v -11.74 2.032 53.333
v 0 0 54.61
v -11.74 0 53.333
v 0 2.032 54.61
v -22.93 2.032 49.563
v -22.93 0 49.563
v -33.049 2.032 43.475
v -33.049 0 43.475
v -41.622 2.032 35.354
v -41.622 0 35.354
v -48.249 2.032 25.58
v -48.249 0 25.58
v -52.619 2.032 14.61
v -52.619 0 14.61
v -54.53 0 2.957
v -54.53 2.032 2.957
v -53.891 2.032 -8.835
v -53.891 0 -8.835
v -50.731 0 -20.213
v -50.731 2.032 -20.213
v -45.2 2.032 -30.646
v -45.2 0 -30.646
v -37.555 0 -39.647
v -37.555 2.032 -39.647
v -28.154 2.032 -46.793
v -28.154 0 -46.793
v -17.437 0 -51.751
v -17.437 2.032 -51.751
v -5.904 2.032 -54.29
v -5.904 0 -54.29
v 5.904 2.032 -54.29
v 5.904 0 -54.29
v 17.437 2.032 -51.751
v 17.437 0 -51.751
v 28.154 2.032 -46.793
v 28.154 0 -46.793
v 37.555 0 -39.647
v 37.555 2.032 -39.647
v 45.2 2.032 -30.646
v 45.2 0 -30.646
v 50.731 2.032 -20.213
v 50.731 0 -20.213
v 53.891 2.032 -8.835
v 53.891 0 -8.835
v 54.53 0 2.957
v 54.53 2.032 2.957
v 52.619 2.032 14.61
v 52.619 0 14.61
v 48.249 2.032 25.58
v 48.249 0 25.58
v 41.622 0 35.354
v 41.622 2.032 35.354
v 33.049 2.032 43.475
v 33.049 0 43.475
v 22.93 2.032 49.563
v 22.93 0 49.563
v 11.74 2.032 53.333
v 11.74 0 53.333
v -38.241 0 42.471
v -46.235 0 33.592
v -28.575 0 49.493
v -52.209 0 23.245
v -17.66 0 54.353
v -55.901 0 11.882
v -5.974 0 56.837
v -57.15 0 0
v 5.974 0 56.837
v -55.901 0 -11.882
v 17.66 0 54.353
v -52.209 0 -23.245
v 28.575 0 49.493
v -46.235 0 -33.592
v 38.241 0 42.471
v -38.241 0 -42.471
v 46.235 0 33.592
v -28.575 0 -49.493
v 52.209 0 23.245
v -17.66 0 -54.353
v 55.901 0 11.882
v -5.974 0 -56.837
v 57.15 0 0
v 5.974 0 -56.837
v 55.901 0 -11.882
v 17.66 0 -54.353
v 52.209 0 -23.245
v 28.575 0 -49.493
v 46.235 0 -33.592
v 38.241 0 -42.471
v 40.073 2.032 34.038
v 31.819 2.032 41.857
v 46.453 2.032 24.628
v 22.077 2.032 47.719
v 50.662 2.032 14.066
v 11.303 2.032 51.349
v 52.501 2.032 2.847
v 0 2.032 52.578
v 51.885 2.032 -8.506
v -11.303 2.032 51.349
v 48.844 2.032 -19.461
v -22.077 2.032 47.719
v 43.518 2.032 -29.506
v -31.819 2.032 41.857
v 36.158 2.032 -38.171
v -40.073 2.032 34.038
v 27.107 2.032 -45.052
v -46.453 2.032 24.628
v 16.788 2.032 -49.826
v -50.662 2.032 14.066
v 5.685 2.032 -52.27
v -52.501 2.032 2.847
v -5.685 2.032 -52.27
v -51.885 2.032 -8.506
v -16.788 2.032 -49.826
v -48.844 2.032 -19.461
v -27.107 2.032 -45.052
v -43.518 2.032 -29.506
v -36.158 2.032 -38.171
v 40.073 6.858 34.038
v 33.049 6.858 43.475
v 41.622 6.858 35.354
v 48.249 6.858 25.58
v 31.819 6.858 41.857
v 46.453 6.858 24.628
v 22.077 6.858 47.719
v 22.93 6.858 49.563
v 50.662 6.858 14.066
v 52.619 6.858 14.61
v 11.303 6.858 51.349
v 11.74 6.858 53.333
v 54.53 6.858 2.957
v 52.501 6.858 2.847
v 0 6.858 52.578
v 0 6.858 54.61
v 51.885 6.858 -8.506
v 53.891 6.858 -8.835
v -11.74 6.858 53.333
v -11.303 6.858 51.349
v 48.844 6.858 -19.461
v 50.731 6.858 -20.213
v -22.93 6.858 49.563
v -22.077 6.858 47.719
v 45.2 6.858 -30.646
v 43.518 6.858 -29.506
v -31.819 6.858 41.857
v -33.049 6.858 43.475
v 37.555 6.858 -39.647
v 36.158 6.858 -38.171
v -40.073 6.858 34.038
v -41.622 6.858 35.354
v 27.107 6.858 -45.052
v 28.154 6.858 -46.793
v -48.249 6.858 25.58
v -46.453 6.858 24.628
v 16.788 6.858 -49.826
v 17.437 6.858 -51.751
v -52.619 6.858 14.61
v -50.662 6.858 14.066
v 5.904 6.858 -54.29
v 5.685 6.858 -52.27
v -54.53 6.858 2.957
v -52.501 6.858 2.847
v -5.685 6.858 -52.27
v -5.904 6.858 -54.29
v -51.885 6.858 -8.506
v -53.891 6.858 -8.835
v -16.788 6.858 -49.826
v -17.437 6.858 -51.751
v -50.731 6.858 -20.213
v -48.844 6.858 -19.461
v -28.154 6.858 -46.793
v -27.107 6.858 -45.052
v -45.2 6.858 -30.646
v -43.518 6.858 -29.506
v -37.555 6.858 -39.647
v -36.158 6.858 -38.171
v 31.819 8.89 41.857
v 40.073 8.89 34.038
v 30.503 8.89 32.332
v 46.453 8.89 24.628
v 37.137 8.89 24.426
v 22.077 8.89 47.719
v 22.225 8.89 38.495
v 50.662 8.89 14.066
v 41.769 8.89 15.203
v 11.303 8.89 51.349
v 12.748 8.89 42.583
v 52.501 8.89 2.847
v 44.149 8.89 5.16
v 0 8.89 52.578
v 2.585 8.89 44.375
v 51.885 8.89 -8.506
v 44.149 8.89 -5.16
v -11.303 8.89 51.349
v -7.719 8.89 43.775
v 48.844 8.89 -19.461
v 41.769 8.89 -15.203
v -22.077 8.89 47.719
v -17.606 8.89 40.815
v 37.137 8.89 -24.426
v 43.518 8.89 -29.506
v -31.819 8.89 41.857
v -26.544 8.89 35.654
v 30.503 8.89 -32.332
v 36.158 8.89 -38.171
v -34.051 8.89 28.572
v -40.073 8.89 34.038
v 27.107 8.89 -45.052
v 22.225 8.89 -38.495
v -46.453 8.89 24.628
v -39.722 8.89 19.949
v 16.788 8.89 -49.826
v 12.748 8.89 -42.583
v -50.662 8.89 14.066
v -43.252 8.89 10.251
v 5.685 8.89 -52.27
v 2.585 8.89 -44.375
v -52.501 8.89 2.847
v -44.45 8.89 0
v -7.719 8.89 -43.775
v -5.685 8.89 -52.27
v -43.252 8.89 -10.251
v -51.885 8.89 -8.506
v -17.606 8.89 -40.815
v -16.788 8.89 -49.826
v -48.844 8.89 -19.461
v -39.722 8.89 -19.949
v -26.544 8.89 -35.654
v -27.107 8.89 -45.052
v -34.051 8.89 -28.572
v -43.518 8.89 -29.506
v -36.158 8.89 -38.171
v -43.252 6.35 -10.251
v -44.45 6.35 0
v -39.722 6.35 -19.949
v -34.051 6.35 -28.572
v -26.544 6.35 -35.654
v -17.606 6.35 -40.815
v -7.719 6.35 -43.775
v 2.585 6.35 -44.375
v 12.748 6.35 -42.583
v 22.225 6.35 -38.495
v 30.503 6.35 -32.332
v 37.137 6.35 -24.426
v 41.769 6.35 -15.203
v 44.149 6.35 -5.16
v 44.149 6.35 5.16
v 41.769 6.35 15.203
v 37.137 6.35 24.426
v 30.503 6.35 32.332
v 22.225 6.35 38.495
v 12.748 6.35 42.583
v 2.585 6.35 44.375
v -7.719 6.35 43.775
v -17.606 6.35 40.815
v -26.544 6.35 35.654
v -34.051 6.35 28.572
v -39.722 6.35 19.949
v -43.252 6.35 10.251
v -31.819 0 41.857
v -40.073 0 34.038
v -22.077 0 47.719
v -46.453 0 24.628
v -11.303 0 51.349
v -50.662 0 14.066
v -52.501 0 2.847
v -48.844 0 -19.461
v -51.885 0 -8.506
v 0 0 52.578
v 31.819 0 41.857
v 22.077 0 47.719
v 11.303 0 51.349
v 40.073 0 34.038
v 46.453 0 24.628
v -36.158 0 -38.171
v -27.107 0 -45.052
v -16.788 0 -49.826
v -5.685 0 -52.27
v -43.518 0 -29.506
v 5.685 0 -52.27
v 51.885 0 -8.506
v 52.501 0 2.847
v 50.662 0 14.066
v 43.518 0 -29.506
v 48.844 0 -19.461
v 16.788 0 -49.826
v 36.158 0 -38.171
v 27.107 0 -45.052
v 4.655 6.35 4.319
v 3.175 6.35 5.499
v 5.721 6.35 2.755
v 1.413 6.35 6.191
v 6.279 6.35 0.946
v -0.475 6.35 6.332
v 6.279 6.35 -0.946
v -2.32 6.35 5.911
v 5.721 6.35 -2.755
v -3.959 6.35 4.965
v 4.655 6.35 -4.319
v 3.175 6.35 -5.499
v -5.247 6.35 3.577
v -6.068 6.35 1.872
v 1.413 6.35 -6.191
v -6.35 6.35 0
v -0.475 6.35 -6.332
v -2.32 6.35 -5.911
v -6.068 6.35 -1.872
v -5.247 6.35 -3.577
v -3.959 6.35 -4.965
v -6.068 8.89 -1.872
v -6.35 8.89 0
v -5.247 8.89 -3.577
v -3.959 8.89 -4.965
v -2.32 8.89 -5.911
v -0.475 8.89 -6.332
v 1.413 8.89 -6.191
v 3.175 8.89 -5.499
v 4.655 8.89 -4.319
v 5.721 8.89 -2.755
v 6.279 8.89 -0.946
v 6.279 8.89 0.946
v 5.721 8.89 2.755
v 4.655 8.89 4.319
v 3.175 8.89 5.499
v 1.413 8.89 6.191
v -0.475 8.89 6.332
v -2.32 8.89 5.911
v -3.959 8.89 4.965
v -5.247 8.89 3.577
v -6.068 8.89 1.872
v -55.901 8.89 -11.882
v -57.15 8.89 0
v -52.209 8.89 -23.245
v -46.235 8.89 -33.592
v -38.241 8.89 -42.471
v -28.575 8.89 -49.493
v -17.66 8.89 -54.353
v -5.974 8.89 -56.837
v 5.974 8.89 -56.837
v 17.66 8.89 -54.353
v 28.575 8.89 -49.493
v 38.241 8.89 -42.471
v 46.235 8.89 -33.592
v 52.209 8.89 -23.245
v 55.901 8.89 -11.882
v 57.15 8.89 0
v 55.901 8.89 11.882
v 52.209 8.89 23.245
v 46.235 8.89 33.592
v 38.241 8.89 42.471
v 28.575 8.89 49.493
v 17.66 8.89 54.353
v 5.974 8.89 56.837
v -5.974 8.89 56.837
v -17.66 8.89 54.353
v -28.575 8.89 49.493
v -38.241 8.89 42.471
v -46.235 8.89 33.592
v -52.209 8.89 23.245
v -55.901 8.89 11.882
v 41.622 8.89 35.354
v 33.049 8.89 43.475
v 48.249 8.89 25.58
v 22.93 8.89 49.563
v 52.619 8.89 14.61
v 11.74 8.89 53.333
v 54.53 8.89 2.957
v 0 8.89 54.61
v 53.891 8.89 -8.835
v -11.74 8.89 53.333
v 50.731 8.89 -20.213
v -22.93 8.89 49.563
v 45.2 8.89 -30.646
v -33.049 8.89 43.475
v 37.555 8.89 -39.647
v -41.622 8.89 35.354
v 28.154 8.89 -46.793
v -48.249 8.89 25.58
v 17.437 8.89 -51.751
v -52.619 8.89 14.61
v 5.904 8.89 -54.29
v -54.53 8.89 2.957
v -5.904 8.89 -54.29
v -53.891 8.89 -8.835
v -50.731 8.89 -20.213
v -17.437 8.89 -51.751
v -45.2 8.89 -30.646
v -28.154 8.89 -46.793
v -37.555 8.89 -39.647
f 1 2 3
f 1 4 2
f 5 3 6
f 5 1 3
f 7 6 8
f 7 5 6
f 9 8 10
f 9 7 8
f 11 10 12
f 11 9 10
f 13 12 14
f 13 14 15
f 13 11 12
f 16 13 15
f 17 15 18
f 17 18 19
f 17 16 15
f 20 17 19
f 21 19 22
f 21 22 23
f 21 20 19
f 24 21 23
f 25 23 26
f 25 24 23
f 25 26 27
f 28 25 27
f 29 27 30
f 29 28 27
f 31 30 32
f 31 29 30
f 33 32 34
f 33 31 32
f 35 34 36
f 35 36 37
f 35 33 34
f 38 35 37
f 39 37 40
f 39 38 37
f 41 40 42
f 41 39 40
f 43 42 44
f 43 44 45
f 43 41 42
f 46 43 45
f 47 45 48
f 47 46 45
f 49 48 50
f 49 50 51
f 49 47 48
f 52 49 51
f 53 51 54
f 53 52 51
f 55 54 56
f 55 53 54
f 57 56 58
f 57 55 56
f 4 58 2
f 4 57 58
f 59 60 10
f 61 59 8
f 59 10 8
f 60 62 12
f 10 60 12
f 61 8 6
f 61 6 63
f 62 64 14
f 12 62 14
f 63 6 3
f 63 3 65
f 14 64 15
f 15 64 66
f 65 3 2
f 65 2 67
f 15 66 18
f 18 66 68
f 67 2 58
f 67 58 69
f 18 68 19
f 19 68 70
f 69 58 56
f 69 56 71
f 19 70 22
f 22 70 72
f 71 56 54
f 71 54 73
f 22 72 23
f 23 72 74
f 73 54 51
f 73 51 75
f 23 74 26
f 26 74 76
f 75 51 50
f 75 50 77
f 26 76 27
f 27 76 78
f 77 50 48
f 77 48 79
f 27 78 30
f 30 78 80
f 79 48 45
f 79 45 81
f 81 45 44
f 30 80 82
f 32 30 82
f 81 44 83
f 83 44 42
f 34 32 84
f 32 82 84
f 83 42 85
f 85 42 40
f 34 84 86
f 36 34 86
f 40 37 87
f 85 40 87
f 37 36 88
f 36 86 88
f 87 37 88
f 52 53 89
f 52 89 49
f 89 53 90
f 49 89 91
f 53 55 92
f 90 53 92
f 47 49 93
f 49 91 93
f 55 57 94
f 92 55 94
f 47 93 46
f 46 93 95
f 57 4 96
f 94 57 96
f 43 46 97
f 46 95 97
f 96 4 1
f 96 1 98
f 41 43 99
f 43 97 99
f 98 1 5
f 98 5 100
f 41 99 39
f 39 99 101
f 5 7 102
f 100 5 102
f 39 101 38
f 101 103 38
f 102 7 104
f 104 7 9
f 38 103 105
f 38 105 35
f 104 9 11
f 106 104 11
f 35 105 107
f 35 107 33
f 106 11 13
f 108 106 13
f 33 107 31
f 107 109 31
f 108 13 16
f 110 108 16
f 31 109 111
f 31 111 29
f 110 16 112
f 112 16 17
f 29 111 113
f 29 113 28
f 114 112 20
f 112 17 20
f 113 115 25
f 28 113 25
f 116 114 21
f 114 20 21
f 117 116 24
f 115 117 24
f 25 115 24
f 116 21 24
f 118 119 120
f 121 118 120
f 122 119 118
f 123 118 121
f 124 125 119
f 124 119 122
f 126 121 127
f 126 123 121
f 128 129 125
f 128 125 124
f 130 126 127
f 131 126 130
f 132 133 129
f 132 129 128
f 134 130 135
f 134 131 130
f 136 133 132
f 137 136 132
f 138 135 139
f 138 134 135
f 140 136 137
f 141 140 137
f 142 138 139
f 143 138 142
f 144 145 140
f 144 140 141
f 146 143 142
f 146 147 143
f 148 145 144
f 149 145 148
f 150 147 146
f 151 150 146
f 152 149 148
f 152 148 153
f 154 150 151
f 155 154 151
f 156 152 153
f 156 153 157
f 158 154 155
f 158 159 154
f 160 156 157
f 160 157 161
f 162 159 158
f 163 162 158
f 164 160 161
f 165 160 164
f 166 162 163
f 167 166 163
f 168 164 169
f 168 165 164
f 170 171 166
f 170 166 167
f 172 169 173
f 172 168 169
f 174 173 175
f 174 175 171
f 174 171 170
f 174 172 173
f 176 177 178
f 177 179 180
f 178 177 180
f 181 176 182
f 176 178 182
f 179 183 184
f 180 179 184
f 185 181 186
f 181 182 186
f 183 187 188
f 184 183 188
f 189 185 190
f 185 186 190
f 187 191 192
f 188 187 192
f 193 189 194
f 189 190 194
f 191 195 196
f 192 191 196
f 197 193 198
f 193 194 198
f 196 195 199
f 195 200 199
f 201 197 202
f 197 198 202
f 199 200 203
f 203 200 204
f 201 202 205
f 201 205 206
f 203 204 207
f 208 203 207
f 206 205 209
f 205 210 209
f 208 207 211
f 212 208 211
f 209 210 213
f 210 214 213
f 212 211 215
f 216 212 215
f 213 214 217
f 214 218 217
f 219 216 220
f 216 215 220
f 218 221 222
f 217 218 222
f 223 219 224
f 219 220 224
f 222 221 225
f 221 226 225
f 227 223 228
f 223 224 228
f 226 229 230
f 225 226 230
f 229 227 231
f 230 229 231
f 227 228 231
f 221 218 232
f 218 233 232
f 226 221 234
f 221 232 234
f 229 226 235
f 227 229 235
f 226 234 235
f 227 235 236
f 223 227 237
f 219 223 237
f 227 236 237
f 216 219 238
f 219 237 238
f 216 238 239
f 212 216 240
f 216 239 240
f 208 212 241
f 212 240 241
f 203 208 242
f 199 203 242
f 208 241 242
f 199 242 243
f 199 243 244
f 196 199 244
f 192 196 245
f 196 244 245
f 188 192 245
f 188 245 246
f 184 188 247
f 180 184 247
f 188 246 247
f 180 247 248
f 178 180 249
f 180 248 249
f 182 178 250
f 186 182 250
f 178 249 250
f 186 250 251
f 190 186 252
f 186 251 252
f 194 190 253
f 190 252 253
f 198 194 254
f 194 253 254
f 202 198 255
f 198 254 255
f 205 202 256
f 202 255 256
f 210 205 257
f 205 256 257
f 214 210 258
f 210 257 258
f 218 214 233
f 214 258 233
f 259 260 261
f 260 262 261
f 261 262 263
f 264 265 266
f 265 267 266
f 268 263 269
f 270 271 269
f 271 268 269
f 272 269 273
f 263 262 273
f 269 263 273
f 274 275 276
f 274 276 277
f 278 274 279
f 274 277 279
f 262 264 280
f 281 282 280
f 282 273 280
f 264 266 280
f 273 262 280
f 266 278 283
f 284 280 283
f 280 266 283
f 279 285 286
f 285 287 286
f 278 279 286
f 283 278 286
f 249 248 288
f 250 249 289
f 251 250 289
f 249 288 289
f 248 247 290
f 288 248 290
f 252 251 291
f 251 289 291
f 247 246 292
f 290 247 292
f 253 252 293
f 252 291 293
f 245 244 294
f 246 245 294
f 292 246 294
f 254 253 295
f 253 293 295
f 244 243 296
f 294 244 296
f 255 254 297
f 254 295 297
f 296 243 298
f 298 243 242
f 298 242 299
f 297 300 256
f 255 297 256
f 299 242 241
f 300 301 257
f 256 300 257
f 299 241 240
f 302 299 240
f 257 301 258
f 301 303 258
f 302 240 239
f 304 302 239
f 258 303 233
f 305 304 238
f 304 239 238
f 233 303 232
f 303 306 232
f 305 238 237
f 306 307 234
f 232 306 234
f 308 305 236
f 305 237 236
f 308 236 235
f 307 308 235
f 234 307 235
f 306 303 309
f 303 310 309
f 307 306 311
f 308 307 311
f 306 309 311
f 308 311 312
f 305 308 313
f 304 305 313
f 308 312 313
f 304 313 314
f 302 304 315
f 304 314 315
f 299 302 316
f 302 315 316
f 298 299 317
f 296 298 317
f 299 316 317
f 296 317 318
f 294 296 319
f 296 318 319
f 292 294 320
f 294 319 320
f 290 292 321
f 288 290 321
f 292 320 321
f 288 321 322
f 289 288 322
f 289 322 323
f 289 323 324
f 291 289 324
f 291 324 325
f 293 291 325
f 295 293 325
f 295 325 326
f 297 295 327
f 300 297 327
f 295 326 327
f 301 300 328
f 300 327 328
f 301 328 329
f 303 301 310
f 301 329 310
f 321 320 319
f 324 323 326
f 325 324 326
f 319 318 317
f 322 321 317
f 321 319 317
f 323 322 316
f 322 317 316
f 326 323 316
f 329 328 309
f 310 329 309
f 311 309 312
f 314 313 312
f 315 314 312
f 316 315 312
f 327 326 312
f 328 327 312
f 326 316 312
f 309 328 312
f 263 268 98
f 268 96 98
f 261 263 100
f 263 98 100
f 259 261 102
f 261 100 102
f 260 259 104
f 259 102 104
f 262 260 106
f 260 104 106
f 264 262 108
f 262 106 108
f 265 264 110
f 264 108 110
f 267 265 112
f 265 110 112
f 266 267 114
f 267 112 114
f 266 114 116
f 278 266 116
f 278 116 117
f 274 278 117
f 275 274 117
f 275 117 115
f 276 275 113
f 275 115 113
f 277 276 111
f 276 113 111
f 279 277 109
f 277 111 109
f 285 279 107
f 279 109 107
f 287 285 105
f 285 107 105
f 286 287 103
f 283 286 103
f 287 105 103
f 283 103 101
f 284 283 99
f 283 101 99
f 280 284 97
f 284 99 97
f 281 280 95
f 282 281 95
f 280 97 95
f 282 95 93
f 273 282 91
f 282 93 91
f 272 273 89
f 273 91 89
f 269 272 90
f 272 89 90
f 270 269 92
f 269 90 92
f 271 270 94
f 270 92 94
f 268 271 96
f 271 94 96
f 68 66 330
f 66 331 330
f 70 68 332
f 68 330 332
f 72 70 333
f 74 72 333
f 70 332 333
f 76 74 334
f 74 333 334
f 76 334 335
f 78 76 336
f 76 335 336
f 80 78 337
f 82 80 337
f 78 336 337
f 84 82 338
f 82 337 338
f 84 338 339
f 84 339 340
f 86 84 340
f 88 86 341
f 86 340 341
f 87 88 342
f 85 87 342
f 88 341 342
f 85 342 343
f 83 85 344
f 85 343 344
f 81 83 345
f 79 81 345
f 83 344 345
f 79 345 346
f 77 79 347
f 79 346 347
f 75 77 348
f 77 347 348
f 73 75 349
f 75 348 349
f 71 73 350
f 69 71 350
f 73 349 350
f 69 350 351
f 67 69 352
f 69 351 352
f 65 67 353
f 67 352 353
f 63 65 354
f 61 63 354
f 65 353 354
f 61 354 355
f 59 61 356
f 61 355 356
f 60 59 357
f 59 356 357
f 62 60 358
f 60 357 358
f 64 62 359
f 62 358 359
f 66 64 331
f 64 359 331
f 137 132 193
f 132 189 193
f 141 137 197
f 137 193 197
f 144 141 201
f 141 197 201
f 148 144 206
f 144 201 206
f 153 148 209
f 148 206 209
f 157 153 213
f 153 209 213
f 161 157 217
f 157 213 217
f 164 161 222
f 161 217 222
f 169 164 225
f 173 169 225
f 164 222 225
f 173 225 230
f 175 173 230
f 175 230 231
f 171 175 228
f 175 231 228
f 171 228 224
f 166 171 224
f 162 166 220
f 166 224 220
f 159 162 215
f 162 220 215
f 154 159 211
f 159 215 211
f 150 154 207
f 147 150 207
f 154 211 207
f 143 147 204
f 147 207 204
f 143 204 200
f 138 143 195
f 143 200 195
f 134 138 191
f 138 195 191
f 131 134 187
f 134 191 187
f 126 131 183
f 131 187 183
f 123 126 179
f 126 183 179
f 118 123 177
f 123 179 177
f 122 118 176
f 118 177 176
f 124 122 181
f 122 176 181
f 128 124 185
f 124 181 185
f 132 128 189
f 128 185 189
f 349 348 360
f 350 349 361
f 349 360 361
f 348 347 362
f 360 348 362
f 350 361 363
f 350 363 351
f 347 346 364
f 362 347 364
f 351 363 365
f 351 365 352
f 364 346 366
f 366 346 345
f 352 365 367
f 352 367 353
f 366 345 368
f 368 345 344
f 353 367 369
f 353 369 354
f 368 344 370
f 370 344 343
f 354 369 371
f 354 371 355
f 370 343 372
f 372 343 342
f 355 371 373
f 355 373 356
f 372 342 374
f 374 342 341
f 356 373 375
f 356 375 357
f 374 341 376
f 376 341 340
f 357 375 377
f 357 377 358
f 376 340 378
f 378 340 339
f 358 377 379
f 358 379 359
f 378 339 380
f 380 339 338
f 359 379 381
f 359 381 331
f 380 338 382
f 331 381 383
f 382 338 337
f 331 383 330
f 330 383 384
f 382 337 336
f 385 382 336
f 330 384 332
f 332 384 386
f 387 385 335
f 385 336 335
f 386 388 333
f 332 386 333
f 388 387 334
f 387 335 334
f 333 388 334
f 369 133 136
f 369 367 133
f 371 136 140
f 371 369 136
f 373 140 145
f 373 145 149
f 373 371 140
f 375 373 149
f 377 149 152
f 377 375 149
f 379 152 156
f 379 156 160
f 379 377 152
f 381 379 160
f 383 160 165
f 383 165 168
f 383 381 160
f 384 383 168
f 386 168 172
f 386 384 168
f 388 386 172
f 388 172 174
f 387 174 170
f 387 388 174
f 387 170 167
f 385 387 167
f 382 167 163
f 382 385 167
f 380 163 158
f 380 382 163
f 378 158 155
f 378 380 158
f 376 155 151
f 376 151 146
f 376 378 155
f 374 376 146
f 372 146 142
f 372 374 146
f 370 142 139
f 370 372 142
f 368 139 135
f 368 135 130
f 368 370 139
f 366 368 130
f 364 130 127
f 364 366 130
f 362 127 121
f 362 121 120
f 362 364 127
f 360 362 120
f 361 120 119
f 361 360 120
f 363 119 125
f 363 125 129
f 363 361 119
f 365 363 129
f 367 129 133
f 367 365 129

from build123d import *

# Parameters (mm, degrees)
O_RINGS_PROFILE_W = 2.032
O_RINGS_PROFILE_H = 2.032


with BuildPart() as part:
    # Main Shape Profile → Main Shape (revolve)
    with BuildSketch(Plane.XY, mode=Mode.PRIVATE) as main_shape_sk:
        Polygon((57.15, 0), (57.15, 8.89), (44.45, 8.89), (44.45, 6.35), (6.35, 6.35), (6.35, 8.89), (0, 8.89), (0, 0), align=None)
    revolve(main_shape_sk.sketch.rotate(Axis((0, 0, 0), (0, -1, 0)), 180), axis=Axis((0, 0, 0), (0, -1, 0)))

    # O Rings Profile → O-Rings Cutout (revolve, cut)
    with BuildSketch(Plane.XY, mode=Mode.PRIVATE) as o_rings_cutout_sk:
        with Locations((53.594, 7.874)):
            Rectangle(O_RINGS_PROFILE_W, O_RINGS_PROFILE_H)
        with Locations((53.594, 1.016)):
            Rectangle(O_RINGS_PROFILE_W, O_RINGS_PROFILE_H)
    revolve(o_rings_cutout_sk.sketch.rotate(Axis((0, 0, 0), (0, -1, 0)), 90), axis=Axis((0, 0, 0), (0, -1, 0)), mode=Mode.SUBTRACT)


solid = part.part
